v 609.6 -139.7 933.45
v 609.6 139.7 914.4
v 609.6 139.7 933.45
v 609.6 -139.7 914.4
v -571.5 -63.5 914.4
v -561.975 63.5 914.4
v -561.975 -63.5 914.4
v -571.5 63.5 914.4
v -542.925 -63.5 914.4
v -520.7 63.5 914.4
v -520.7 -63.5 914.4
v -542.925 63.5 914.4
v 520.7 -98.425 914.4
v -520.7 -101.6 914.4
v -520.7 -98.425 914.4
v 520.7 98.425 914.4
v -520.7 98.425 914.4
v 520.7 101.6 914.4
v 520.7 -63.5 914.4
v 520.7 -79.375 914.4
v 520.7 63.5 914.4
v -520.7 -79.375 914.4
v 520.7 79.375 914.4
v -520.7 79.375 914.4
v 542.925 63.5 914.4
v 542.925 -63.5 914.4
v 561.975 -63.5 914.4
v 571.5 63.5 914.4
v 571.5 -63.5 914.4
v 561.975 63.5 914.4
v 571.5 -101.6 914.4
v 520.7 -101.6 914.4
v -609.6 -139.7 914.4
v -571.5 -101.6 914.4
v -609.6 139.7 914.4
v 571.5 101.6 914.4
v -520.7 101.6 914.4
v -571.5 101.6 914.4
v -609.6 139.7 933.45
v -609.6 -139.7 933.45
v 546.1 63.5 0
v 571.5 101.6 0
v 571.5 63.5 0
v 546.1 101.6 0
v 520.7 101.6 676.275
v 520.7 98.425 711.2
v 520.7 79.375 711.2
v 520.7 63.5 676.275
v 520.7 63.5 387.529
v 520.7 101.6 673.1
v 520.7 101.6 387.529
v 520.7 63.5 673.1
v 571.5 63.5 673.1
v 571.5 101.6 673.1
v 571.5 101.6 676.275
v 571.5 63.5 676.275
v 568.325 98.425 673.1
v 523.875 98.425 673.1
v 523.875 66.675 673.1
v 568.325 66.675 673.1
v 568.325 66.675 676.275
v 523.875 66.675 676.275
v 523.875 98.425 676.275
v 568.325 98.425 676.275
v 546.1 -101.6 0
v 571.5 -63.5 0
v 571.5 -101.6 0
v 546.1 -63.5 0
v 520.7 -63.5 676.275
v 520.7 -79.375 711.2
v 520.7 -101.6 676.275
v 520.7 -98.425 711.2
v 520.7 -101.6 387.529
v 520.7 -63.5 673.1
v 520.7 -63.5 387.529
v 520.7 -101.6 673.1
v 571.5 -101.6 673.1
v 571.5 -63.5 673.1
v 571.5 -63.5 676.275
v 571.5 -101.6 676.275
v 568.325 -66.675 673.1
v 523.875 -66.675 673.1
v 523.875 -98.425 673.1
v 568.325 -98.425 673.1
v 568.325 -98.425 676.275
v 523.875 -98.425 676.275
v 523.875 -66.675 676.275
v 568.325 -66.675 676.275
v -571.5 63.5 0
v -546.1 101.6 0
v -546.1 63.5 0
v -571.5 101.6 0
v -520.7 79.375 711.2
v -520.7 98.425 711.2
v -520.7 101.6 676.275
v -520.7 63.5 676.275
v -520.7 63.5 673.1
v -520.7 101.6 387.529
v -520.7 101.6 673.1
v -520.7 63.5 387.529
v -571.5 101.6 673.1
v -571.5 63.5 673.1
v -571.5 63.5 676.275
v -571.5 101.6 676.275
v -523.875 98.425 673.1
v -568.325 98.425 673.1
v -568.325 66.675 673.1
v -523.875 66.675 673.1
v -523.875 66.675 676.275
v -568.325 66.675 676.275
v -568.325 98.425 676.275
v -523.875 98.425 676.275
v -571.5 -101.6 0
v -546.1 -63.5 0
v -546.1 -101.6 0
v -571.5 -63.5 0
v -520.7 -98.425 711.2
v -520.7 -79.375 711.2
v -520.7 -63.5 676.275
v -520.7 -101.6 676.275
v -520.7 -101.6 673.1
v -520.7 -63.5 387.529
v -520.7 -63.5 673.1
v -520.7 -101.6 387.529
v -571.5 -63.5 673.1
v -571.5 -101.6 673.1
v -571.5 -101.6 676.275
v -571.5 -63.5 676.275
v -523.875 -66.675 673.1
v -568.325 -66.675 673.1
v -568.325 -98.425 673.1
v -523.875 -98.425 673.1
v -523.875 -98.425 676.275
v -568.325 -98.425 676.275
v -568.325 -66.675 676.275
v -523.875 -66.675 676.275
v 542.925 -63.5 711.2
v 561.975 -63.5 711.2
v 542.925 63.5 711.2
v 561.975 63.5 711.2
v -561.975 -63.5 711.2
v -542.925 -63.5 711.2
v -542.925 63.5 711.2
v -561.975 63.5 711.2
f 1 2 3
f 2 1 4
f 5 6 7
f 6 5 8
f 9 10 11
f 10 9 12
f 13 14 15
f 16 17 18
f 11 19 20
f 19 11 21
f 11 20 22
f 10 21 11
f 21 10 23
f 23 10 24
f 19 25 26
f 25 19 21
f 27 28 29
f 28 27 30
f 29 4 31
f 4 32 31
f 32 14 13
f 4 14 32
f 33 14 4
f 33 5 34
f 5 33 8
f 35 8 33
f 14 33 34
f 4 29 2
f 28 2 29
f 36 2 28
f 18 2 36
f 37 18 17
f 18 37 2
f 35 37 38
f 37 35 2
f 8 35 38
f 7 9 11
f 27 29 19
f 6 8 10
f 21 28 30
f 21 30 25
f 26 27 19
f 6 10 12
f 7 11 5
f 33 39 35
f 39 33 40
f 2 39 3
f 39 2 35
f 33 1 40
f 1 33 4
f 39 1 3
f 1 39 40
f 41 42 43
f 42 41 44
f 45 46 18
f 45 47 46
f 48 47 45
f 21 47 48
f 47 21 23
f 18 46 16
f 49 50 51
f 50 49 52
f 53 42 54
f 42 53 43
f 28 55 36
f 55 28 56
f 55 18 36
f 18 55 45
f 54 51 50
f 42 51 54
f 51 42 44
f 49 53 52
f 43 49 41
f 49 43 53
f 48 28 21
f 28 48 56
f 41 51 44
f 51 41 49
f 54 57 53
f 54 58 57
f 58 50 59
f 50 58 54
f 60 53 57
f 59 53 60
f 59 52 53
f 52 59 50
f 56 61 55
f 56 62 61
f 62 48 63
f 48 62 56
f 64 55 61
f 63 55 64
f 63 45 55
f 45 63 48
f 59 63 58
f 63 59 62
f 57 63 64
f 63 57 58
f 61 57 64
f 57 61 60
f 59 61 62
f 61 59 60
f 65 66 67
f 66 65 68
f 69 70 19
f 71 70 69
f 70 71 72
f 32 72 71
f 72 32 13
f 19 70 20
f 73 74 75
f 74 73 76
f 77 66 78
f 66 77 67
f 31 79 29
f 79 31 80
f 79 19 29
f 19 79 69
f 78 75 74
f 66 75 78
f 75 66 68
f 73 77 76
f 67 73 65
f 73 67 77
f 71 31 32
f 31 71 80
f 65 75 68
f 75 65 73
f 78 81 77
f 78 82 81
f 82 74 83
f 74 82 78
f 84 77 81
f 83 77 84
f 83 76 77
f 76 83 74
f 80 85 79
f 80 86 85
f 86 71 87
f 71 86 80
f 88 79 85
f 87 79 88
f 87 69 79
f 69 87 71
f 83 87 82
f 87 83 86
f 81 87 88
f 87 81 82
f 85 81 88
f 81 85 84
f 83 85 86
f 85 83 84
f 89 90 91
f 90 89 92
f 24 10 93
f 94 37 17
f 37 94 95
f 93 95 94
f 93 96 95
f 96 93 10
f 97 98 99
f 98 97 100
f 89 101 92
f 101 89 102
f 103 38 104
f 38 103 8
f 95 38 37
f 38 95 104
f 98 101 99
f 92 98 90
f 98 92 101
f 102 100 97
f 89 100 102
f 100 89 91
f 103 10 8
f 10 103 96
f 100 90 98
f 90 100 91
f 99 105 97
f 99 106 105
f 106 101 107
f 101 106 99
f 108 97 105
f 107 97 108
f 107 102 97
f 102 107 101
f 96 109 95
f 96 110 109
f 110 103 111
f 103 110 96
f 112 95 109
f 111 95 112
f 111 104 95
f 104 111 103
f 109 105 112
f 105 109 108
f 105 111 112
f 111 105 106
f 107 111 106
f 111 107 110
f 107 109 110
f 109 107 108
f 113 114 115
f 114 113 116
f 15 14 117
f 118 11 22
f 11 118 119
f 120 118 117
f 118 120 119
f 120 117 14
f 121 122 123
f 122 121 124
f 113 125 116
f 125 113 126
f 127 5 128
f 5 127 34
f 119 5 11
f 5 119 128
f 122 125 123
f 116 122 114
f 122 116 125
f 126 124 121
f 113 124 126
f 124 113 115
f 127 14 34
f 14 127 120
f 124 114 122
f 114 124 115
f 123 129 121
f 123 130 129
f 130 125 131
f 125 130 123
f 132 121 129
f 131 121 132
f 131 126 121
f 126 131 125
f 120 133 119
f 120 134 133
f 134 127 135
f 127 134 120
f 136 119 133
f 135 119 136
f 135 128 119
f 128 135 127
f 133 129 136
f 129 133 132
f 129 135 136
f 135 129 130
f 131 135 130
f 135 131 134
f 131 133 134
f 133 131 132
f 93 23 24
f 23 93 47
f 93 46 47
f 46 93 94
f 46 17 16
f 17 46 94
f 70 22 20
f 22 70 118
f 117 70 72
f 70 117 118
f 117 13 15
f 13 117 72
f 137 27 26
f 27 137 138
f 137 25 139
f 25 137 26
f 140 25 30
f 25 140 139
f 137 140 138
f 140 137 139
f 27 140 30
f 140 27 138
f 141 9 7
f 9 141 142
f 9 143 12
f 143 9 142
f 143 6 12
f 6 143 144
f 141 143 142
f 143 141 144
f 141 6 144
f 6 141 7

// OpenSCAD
/**
 * Parametric entryway table designed for layered plywood construction.
 * All dimensions are in millimeters.
 */

/* [Tabletop] */
// Tabletop width along X
Top_Width = 1219.2;

// Tabletop depth along Y
Top_Depth = 279.4;

// Tabletop overhang beyond the leg outer faces
Top_Overhang = 38.1;

/* [Legs] */
// Leg height from floor to underside of the top
Leg_Height = 914.4;

// Width of each board in the L-shaped leg
Leg_Board_Width = 50.8;

/* [Apron] */
// Height of the apron boards
Apron_Height = 203.2;

// Width of the front and back apron boards (0 = auto)
Apron_Width = 0;

// Depth of the side apron boards (0 = auto)
Apron_Depth = 0;

/* [Plywood] */
// Plywood sheet thickness
Board_Thickness = 19.05;

// Number of plies for alternating veneer visualization
Ply_Count = 5; // [1:1:10]

/* [Hidden] */
APRON_SIDE_INSET = 76.2;
apron_width = (Apron_Width > 0) ? Apron_Width : (Top_Width - 2 * Top_Overhang - 2 * Leg_Board_Width);
apron_depth = (Apron_Depth > 0) ? Apron_Depth : (Top_Depth - 2 * Top_Overhang - APRON_SIDE_INSET);

// Generates a rectangular board with alternating colored veneer layers.
module plywood(length, width, thickness, layers) {
  scale([length, width, thickness]) {
    layer_thickness = 1 / layers;
    translate([-0.5, -0.5, 0]) {
      for (i = [0:layers - 1]) {
        color(i % 2 == 0 ? "burlywood" : "wheat") translate([0, 0, layer_thickness * i]) cube([1, 1, layer_thickness]);
      }
    }
  }
}

// Convenience wrapper for a plywood board using default thickness and ply count.
module board(length, width) {
  plywood(length, width, Board_Thickness, Ply_Count);
}

// Generates the tabletop board centered at the origin.
module top() {
  board(Top_Width, Top_Depth);
}

// Assembles an L-shaped corner leg from two perpendicular boards.
module leg() {
  translate([0, 0, Leg_Height / 2]) rotate([0, 90, 90]) {
    translate([0, 0, -Board_Thickness]) board(Leg_Height, Leg_Board_Width);
    board(Leg_Height, Leg_Board_Width);
  }
}

// Applies a 3.75-degree taper cut along the lower inner face of the leg.
module leg_with_angle() {
  difference() {
    leg();

    // Cut from the middle of the bottom of the leg at a 3.75 degree angle
    // towards the inner (left) edge.
    rotate([0, -90 / 24, 0]) translate([-50.8, -38.1, 0]) cube([Leg_Board_Width, 76.2, Leg_Height]);
  }
}

// Rectangular perimeter cutter for decorative accent grooves.
module leg_ring() {
  linear_extrude(height=3.175) difference() {
    square([101.6, 76.2], center=true);
    square([44.45, 31.75], center=true);
  }
}

// Leg with upper and lower decorative accent grooves.
module leg_with_rings() {
  difference() {
    leg();
    translate([0, 0, Leg_Height - Apron_Height - 38.1]) leg_ring();
    translate([0, 0, 114.3]) leg_ring();
  }
}

// Angled leg with upper decorative accent groove below the apron.
module leg_with_angle_and_ring() {
  difference() {
    leg_with_angle();
    translate([0, 0, Leg_Height - Apron_Height - 38.1]) leg_ring();
  }
}

// Front and back apron rail board oriented vertically along the X axis.
module apron_front() {
  color("tan") translate([0, 0, Apron_Height / 2]) rotate([-90, 0, 0]) board(apron_width, Apron_Height);
}

// Side apron rail board oriented vertically along the Y axis.
module apron_side() {
  color("tan") translate([0, 0, Apron_Height / 2]) rotate([-90, 0, -90]) board(apron_depth, Apron_Height);
}

// Full entryway table assembly: tabletop, four angled legs, and apron rails.
module table() {
  // top
  translate([0, 0, Leg_Height]) top();

  // legs
  leg_x_offset = (Top_Width / 2) - Top_Overhang - (Leg_Board_Width / 2);
  leg_y_offset = (Top_Depth / 2) - Top_Overhang - Board_Thickness;
  translate([leg_x_offset, leg_y_offset, 0]) leg_with_angle_and_ring();
  translate([leg_x_offset, -leg_y_offset, 0]) leg_with_angle_and_ring();
  mirror([1, 0, 0]) translate([leg_x_offset, leg_y_offset, 0]) leg_with_angle_and_ring();
  mirror([1, 0, 0]) translate([leg_x_offset, -leg_y_offset, 0]) leg_with_angle_and_ring();

  // apron
  translate([0, 0, Leg_Height - Apron_Height]) {
    apron_x_offset = leg_x_offset - 3.175;
    apron_y_offset = leg_y_offset - 3.175;
    translate([0, apron_y_offset, 0]) apron_front();
    mirror([0, 1, 0]) translate([0, apron_y_offset, 0]) apron_front();
    translate([apron_x_offset, 0, 0]) apron_side();
    mirror([1, 0, 0]) translate([apron_x_offset, 0, 0]) apron_side();
  }
}

table();
